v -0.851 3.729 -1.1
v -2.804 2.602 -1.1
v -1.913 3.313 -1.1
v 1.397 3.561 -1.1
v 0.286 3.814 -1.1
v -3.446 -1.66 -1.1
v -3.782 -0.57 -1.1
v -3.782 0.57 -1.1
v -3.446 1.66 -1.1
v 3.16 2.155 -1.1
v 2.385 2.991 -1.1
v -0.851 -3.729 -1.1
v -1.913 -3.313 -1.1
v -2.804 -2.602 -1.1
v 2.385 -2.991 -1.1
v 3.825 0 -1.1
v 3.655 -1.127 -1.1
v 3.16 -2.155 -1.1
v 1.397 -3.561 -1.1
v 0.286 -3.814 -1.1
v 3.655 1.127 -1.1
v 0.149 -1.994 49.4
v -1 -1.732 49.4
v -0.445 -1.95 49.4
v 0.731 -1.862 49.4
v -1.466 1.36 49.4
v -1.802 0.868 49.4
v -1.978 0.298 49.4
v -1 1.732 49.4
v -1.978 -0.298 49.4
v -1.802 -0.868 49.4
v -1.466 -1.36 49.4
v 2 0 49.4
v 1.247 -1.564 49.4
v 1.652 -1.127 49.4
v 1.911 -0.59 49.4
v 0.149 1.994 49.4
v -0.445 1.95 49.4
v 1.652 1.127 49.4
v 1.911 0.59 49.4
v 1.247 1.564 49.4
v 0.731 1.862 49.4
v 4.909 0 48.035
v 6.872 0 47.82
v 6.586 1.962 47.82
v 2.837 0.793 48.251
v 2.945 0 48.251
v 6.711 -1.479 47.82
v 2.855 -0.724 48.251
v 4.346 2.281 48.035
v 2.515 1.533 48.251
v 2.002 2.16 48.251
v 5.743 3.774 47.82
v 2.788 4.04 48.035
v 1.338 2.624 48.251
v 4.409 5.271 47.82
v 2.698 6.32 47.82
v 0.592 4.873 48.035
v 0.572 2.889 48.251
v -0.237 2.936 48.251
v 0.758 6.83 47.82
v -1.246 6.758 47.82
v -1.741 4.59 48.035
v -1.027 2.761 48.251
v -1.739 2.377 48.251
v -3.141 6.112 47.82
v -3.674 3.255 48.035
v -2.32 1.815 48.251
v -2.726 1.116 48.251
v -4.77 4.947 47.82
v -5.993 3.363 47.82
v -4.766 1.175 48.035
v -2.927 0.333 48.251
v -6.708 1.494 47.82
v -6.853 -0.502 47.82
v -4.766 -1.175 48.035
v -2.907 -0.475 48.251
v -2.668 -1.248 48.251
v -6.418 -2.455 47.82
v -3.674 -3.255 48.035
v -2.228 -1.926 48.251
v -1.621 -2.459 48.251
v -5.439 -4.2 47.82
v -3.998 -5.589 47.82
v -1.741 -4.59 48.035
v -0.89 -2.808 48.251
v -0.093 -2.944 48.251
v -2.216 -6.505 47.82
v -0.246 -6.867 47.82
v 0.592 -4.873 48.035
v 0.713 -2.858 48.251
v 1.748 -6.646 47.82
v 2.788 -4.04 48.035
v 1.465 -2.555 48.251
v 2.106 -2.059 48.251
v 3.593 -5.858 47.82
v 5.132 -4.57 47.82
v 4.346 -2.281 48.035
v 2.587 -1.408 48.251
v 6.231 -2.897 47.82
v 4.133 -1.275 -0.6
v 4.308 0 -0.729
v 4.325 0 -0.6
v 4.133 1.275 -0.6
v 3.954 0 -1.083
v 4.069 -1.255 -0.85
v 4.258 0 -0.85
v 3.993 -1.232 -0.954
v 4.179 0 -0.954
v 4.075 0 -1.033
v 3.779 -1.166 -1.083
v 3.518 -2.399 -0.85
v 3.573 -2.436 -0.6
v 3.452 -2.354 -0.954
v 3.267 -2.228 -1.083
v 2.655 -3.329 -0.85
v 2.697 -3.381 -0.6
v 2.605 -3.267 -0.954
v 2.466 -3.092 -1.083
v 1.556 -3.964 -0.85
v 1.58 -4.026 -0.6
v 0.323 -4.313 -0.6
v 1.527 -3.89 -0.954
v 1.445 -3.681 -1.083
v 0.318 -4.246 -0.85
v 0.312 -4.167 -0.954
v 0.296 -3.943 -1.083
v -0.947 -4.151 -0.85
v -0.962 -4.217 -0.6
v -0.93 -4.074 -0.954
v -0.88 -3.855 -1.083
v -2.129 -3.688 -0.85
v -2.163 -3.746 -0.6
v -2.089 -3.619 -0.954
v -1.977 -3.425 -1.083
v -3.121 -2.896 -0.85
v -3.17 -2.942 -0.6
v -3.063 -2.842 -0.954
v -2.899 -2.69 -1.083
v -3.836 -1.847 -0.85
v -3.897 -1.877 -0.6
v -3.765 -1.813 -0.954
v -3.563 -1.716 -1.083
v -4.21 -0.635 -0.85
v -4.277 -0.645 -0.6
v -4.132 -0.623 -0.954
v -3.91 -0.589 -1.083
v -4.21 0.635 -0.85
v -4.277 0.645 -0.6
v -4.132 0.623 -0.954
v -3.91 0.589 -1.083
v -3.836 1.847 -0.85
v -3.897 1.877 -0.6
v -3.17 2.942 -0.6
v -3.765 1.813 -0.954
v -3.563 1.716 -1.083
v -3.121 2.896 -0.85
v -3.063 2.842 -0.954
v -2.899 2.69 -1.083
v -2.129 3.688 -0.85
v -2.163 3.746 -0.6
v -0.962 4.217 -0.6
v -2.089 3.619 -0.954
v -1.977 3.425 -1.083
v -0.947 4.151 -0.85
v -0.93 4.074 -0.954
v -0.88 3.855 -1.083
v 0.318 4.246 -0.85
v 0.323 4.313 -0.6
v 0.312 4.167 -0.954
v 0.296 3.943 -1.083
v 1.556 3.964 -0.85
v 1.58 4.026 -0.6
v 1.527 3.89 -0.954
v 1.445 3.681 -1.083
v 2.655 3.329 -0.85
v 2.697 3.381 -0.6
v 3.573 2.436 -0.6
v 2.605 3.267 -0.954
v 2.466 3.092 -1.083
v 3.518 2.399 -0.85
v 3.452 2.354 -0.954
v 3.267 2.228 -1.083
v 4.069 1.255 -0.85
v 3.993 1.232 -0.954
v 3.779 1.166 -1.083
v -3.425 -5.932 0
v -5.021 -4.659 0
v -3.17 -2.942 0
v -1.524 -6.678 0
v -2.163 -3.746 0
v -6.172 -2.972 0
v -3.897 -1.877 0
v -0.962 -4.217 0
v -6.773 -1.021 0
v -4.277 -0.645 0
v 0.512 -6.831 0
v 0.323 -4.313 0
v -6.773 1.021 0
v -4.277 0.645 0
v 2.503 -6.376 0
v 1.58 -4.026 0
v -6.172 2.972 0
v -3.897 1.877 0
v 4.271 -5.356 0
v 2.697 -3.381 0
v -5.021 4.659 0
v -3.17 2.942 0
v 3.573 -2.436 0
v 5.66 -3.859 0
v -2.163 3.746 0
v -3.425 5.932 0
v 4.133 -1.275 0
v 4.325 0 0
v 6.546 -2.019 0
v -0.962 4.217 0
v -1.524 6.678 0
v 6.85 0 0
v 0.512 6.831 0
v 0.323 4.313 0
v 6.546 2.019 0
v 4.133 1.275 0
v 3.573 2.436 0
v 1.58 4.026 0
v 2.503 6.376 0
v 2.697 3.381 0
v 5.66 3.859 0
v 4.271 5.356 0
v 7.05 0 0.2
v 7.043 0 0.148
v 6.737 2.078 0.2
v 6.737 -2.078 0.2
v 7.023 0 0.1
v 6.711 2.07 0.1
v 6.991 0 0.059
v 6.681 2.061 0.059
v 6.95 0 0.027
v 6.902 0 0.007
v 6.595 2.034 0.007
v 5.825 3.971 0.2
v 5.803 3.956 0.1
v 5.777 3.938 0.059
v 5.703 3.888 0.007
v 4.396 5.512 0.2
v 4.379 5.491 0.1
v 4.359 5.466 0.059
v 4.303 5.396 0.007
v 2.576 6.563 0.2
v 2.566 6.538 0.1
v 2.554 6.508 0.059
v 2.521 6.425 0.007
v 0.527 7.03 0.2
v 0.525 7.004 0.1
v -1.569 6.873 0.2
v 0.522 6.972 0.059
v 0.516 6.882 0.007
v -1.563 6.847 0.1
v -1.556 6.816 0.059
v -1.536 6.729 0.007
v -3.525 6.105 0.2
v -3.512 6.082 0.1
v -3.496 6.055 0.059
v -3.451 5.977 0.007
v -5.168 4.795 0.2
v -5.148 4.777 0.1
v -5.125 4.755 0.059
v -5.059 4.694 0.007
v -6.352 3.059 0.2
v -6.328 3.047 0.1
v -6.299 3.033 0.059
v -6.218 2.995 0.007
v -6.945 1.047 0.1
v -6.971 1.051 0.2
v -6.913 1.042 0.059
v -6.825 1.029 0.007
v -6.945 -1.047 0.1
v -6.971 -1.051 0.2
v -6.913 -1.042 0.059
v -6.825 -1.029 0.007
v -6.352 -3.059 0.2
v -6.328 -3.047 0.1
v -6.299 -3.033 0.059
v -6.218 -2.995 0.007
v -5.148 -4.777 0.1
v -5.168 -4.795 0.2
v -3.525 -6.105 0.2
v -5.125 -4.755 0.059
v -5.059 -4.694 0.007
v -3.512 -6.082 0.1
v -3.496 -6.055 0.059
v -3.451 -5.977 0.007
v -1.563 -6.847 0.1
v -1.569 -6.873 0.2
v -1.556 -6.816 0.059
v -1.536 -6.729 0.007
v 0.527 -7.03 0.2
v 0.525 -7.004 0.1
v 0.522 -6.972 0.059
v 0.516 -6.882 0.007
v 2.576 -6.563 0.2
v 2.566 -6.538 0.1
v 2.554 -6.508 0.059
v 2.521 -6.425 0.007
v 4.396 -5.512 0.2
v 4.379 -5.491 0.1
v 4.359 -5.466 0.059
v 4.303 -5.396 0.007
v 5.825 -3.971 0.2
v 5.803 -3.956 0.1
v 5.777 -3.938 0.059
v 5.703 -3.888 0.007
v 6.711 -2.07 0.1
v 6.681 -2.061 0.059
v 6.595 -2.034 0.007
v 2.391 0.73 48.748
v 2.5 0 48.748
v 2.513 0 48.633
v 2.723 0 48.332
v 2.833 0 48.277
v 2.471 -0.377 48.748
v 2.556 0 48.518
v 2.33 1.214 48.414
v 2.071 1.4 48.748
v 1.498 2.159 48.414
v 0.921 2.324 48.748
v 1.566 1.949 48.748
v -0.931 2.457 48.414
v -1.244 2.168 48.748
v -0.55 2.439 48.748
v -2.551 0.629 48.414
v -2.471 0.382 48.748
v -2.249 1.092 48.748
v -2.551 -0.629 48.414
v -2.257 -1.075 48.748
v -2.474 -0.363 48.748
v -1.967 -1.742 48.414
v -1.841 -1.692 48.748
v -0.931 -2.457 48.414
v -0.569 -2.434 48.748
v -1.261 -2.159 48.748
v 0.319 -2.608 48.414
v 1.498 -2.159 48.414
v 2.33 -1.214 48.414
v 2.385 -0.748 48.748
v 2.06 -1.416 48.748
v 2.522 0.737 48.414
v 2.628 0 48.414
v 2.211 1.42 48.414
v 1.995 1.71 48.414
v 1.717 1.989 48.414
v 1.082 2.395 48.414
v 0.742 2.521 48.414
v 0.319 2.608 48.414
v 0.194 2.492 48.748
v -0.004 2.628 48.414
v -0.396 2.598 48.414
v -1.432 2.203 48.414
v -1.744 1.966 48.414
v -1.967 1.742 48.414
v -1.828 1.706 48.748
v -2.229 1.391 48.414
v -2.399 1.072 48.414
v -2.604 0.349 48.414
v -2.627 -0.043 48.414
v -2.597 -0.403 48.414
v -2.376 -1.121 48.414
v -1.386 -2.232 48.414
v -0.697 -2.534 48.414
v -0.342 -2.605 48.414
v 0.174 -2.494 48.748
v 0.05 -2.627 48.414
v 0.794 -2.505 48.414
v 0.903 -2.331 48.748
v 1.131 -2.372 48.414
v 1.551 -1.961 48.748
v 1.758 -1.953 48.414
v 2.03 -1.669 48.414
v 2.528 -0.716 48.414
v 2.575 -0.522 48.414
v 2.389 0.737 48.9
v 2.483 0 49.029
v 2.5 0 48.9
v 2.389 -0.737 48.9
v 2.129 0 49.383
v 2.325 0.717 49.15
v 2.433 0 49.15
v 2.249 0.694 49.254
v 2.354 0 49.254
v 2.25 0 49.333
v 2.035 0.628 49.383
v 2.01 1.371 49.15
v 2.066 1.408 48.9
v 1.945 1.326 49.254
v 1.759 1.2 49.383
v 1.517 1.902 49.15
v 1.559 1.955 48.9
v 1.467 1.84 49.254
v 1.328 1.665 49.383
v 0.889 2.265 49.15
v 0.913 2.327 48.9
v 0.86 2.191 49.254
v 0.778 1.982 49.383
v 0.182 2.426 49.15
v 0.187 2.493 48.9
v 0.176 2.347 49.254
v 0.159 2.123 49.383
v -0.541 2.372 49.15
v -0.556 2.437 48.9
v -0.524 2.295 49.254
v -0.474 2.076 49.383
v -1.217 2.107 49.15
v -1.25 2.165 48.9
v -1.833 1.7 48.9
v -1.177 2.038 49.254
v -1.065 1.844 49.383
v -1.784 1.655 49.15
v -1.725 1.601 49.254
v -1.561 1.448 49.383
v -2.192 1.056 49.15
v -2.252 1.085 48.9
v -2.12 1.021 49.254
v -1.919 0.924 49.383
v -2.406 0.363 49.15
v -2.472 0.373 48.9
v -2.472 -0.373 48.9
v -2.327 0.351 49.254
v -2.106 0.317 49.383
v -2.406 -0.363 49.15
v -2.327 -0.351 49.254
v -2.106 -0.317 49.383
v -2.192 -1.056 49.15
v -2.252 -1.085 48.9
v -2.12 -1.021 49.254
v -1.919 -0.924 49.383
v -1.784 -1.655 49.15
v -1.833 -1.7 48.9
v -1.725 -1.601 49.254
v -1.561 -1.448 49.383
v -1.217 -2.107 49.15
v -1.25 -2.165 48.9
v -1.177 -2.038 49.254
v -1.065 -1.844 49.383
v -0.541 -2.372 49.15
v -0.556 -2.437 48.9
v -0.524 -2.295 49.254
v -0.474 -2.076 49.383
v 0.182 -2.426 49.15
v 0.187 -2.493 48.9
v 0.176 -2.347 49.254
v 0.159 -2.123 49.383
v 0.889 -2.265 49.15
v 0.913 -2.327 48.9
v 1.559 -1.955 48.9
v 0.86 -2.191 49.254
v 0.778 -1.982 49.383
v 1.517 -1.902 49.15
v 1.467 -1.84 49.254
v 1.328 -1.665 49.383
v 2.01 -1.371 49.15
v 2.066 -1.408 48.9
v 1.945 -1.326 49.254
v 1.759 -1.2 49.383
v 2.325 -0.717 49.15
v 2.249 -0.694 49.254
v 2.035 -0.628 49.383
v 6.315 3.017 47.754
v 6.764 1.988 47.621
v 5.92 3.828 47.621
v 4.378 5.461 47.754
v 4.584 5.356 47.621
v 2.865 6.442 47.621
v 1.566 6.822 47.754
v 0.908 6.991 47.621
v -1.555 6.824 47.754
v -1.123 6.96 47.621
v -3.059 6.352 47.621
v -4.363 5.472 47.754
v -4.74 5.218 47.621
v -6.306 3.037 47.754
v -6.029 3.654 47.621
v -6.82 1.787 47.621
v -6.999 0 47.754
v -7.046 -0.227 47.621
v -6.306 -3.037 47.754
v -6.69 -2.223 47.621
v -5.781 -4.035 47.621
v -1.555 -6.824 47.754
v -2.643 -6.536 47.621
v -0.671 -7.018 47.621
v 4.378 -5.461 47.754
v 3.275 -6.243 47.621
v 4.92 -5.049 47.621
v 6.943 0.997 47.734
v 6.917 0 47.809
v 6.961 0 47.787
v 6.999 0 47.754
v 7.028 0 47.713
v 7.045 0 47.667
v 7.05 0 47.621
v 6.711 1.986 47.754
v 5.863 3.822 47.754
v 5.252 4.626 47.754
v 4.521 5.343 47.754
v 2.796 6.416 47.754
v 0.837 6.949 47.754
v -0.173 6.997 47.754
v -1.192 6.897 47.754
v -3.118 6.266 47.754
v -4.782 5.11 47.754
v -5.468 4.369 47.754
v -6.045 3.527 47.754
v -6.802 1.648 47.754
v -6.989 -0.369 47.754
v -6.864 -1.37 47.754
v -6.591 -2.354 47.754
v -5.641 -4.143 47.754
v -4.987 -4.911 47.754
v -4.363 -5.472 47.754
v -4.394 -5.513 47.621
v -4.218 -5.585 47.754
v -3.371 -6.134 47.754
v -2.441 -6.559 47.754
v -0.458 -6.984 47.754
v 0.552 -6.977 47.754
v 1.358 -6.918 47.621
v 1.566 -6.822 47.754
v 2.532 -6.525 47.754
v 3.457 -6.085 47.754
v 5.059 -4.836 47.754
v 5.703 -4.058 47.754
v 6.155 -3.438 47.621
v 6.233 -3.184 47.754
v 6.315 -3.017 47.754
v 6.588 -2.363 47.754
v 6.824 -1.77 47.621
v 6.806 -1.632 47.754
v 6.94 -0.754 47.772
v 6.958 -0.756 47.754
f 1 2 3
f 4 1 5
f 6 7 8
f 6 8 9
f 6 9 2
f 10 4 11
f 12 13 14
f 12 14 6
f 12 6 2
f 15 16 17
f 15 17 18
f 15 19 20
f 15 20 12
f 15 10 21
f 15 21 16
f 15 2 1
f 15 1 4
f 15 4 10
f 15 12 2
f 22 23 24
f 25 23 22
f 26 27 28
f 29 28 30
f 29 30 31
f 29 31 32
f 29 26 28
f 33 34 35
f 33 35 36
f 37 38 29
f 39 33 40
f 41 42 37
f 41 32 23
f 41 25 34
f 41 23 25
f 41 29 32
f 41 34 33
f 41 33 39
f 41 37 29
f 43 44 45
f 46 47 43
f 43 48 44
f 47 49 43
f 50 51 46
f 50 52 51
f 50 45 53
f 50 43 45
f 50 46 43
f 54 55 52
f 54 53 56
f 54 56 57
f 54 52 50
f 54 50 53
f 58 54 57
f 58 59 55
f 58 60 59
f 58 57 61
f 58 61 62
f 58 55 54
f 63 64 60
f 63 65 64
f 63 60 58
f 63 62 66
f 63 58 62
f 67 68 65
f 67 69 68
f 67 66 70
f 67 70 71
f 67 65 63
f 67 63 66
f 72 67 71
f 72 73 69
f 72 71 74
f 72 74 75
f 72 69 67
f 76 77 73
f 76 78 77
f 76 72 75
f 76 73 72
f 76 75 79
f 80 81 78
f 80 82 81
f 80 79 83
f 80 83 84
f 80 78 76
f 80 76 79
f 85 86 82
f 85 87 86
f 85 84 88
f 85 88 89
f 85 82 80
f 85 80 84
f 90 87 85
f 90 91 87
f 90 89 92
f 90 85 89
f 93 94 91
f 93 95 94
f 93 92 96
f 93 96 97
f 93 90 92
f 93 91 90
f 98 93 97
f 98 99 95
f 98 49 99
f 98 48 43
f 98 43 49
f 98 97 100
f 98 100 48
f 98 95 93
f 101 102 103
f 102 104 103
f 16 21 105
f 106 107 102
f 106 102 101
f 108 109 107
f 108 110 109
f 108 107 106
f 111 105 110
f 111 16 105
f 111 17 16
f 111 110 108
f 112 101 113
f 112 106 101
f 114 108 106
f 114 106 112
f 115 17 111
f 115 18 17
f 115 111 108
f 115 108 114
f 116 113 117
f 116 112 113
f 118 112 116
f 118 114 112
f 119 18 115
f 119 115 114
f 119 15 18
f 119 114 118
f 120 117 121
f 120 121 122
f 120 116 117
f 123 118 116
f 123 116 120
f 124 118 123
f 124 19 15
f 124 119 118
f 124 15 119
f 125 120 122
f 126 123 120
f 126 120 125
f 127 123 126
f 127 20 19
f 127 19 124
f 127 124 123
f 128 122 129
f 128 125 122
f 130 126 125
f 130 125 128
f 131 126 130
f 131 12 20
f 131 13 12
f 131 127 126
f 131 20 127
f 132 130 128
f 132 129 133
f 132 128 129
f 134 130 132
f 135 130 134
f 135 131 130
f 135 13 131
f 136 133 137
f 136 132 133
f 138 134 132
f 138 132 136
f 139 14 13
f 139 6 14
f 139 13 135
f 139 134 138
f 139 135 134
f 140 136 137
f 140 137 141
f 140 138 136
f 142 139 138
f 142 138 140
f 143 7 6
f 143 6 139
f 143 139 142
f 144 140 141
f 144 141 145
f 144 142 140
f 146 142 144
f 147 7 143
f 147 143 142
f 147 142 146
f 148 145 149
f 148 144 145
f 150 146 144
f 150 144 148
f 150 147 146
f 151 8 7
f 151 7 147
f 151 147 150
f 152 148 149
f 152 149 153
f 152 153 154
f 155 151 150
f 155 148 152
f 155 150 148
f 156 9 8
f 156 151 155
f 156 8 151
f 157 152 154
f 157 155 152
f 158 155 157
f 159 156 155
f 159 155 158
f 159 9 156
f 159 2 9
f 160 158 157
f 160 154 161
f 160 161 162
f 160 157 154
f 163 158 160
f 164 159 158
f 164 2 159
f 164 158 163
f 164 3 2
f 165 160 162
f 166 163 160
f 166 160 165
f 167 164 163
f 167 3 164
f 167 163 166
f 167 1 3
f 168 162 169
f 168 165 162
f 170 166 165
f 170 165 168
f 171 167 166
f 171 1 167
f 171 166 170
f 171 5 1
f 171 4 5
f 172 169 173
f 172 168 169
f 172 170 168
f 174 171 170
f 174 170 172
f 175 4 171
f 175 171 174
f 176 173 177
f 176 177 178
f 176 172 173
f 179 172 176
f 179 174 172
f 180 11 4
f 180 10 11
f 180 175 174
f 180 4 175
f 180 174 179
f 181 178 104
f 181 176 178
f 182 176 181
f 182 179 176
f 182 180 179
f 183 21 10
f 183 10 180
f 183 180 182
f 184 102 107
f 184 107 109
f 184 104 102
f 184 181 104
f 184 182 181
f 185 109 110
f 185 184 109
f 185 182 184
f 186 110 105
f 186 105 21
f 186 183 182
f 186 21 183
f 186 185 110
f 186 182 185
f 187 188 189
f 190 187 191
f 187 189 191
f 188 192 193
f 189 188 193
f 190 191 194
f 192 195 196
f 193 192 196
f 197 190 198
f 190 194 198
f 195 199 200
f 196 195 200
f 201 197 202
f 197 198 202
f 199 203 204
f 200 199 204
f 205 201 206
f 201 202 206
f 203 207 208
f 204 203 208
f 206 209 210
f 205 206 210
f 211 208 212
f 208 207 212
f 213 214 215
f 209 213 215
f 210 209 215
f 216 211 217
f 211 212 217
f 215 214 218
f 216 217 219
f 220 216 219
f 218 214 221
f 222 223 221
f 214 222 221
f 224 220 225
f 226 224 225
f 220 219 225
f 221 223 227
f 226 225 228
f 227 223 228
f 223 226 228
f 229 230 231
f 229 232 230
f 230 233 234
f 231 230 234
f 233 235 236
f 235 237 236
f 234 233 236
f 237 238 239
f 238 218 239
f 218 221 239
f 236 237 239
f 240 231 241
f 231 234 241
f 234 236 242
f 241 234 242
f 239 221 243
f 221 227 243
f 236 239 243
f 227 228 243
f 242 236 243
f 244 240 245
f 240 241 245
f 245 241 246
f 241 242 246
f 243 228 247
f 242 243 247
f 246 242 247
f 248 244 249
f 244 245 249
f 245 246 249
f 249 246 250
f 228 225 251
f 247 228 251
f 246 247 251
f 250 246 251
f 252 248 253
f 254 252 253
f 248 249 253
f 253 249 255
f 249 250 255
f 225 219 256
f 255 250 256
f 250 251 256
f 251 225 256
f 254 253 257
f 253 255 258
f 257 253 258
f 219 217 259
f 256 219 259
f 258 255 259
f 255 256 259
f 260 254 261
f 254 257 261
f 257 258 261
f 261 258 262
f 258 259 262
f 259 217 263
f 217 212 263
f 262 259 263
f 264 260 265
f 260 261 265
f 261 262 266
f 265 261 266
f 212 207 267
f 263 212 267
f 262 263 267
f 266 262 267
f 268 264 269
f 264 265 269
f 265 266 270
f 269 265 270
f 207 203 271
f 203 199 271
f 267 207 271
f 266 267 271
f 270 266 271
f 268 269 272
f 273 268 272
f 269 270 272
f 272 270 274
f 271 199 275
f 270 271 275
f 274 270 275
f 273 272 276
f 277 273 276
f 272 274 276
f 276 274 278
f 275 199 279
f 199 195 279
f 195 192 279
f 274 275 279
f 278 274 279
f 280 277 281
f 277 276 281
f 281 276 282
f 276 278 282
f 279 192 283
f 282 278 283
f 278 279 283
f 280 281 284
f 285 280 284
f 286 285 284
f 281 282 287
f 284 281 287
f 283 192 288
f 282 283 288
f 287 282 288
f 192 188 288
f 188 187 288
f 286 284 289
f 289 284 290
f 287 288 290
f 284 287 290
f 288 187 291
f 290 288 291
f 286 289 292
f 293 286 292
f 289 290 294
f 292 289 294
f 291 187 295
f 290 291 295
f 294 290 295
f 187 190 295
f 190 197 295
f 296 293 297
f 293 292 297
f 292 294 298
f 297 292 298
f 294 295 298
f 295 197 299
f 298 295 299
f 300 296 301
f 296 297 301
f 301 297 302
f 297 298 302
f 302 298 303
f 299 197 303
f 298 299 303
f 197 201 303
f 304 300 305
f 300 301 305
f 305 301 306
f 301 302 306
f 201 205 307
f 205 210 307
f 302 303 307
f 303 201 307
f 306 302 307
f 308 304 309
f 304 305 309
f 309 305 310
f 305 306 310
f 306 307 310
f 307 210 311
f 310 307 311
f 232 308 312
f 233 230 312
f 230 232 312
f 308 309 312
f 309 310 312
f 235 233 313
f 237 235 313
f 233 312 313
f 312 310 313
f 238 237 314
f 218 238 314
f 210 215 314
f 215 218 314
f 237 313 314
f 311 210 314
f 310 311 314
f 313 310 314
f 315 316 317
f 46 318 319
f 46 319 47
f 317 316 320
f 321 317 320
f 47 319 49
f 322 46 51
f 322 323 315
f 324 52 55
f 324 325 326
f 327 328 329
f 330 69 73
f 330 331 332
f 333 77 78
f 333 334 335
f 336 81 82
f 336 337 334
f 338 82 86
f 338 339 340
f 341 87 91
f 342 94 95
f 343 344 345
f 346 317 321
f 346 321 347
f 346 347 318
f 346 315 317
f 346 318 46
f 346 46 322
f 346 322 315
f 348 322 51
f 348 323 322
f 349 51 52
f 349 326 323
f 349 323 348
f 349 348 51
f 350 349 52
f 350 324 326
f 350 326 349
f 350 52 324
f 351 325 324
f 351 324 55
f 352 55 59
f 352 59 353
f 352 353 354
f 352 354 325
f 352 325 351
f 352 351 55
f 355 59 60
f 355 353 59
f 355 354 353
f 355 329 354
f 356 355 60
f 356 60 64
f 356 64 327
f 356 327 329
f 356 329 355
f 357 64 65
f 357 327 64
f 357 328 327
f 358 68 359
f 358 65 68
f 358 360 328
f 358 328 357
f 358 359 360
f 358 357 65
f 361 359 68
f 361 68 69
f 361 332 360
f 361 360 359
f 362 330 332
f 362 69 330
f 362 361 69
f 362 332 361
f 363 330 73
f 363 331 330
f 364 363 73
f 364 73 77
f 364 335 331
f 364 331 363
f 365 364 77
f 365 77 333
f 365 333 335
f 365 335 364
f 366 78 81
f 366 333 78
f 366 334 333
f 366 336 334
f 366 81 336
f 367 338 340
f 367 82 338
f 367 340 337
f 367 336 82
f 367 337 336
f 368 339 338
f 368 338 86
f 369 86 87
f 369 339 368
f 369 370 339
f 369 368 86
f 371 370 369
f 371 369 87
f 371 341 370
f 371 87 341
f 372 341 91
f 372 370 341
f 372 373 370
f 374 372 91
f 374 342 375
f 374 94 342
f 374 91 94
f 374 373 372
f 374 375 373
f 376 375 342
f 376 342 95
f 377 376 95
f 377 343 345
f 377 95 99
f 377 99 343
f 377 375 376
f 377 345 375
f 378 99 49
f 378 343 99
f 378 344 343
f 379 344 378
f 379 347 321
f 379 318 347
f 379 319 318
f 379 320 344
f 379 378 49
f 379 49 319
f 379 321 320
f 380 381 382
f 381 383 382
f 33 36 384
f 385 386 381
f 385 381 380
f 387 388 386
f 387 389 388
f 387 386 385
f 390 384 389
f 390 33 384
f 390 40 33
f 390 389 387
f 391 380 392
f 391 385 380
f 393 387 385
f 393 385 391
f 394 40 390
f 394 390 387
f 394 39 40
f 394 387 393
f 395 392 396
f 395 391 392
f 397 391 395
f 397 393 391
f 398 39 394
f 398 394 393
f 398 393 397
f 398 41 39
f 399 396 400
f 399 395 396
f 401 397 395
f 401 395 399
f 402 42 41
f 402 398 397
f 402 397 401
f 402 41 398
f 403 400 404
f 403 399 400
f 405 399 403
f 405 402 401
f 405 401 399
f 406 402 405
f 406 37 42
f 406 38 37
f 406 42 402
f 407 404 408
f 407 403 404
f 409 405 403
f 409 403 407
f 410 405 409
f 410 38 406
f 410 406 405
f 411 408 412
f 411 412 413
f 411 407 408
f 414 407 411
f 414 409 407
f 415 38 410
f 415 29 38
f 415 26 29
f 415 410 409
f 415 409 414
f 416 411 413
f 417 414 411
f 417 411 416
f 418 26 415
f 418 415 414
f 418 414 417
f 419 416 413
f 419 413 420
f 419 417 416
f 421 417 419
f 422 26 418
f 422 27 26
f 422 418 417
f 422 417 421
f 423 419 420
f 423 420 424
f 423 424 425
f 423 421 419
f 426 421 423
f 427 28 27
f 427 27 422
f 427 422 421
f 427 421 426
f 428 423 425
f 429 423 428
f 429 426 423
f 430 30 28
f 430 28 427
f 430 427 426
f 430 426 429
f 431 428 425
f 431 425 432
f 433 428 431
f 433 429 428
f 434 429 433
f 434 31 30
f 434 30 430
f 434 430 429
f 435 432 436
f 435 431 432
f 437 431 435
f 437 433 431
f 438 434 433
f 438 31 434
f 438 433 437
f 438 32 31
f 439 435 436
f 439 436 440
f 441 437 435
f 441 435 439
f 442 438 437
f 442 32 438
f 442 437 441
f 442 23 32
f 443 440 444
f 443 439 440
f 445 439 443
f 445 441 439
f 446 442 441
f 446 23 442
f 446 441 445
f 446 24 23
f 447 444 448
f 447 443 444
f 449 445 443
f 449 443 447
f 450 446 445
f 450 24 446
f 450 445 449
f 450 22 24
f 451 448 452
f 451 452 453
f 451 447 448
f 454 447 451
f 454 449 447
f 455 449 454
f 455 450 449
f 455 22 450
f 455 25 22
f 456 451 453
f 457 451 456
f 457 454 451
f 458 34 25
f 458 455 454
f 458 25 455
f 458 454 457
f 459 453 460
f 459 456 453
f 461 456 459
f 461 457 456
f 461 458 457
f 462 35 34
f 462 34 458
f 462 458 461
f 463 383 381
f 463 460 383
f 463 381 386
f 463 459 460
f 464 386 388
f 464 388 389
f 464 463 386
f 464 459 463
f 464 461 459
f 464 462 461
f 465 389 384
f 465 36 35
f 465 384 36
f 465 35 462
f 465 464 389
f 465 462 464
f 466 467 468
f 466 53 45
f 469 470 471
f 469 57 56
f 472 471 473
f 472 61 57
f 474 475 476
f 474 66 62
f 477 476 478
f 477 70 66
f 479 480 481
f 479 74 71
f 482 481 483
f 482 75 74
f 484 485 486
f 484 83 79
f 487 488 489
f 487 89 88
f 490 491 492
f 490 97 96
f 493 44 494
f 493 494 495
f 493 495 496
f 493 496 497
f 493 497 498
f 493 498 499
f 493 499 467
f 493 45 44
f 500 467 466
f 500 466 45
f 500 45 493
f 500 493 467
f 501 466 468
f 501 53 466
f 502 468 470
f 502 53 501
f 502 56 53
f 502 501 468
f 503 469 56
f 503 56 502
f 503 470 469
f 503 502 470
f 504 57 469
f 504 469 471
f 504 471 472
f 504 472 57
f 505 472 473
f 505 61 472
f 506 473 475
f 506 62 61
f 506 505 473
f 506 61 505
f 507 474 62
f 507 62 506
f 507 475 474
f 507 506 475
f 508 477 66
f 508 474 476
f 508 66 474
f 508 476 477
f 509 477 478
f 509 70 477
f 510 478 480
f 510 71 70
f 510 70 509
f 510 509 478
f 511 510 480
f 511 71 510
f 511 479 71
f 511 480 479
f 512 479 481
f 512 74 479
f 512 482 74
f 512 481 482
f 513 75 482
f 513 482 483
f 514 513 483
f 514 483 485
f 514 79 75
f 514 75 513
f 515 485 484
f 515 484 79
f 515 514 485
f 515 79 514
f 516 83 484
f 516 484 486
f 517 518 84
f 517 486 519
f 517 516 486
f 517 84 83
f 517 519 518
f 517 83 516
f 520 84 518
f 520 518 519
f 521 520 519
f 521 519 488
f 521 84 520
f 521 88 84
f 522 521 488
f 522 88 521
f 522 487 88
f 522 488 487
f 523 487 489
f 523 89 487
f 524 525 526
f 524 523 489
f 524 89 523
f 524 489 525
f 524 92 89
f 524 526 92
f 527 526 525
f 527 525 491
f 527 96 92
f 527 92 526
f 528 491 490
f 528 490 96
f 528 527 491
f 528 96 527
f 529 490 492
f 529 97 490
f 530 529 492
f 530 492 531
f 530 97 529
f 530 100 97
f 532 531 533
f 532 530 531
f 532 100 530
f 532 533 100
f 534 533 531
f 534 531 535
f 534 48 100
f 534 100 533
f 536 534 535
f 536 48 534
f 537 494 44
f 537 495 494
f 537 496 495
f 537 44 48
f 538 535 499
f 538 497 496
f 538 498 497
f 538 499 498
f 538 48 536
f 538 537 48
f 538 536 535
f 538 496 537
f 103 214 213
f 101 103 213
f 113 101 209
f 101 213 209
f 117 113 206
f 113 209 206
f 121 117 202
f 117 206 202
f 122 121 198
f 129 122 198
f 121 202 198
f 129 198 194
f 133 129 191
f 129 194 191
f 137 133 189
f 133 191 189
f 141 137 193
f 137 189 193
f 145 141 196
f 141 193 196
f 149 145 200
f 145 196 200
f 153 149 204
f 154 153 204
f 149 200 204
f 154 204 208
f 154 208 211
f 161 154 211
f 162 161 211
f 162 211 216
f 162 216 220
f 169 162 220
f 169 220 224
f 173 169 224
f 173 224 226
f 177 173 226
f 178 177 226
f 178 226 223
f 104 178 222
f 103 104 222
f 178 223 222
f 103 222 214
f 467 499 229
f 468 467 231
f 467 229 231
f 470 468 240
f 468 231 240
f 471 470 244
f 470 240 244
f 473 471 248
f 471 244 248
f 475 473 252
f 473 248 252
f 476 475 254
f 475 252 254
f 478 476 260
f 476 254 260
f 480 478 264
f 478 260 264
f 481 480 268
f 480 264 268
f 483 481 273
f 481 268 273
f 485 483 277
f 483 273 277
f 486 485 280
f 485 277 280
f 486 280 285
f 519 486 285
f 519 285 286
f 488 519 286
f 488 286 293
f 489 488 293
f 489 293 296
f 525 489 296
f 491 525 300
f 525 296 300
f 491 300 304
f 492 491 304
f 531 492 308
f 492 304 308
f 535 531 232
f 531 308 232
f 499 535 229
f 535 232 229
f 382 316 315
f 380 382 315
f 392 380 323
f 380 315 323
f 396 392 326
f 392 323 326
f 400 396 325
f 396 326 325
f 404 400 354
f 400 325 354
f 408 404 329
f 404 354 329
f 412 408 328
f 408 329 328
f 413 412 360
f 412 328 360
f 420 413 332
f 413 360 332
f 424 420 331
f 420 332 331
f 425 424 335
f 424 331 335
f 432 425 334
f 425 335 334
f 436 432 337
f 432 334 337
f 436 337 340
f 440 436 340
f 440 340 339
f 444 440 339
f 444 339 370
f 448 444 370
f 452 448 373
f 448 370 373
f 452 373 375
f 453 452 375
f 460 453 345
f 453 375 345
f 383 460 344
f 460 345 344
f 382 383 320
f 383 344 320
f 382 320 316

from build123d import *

# Parameters (mm, degrees)
F0_R     = 7.05
F1_DEPTH = 47.8
F2_R     = 4.325
F3_DEPTH = 1.1
F4_R     = 2.5
F5_DEPTH = 0.5
F6_R     = 7.05
F7_R     = 2.5
F9_DEPTH = 1.1
F10_R    = 0.5
F11_R    = 0.5
F12_R    = 0.5
F13_R    = 0.2
F14_R    = 0.2


with BuildPart() as f1:
    # F0 (on Top) → F1 (new body)
    with BuildSketch(Plane.XY):
        Circle(F0_R)
    extrude(amount=F1_DEPTH)

    # F2 (on face) → F3 (join)
    with BuildSketch(Plane(origin=(0, 0, 0), x_dir=(1, 0, 0), z_dir=(0, 0, -1))):
        Circle(F2_R)
    extrude(amount=F3_DEPTH)

    # F4 (on face) → F5 (join)
    with BuildSketch(Plane.XY.offset(47.8)):
        Circle(F4_R)
    extrude(amount=F5_DEPTH)

    # F6 (on face) → F8 section 0
    with BuildSketch(Plane.XY.offset(47.8)):
        Circle(F6_R)
    # F7 (on face) → F8 section 1
    with BuildSketch(Plane.XY.offset(48.3)):
        Circle(F7_R)
    loft()

    # F7 (on face) → F9 (join)
    with BuildSketch(Plane.XY.offset(48.3)):
        Circle(F7_R)
    extrude(amount=F9_DEPTH)

    # F10
    f10_edges = [f1.edges().sort_by_distance(p)[0] for p in [
        (-4.325, 0, -1.1),
    ]]
    fillet(f10_edges, radius=F10_R)

    # F11
    f11_edges = [f1.edges().sort_by_distance(p)[0] for p in [
        (-2.5, 0, 49.4),
    ]]
    fillet(f11_edges, radius=F11_R)

    # F12
    f12_edges = [f1.edges().sort_by_distance(p)[0] for p in [
        (-2.5, 0, 48.3),
    ]]
    fillet(f12_edges, radius=F12_R)

    # F13
    f13_edges = [f1.edges().sort_by_distance(p)[0] for p in [
        (-7.05, 0, 47.8),
    ]]
    fillet(f13_edges, radius=F13_R)

    # F14
    f14_edges = [f1.edges().sort_by_distance(p)[0] for p in [
        (-7.05, 0, 0),
    ]]
    fillet(f14_edges, radius=F14_R)


solid = f1.part
